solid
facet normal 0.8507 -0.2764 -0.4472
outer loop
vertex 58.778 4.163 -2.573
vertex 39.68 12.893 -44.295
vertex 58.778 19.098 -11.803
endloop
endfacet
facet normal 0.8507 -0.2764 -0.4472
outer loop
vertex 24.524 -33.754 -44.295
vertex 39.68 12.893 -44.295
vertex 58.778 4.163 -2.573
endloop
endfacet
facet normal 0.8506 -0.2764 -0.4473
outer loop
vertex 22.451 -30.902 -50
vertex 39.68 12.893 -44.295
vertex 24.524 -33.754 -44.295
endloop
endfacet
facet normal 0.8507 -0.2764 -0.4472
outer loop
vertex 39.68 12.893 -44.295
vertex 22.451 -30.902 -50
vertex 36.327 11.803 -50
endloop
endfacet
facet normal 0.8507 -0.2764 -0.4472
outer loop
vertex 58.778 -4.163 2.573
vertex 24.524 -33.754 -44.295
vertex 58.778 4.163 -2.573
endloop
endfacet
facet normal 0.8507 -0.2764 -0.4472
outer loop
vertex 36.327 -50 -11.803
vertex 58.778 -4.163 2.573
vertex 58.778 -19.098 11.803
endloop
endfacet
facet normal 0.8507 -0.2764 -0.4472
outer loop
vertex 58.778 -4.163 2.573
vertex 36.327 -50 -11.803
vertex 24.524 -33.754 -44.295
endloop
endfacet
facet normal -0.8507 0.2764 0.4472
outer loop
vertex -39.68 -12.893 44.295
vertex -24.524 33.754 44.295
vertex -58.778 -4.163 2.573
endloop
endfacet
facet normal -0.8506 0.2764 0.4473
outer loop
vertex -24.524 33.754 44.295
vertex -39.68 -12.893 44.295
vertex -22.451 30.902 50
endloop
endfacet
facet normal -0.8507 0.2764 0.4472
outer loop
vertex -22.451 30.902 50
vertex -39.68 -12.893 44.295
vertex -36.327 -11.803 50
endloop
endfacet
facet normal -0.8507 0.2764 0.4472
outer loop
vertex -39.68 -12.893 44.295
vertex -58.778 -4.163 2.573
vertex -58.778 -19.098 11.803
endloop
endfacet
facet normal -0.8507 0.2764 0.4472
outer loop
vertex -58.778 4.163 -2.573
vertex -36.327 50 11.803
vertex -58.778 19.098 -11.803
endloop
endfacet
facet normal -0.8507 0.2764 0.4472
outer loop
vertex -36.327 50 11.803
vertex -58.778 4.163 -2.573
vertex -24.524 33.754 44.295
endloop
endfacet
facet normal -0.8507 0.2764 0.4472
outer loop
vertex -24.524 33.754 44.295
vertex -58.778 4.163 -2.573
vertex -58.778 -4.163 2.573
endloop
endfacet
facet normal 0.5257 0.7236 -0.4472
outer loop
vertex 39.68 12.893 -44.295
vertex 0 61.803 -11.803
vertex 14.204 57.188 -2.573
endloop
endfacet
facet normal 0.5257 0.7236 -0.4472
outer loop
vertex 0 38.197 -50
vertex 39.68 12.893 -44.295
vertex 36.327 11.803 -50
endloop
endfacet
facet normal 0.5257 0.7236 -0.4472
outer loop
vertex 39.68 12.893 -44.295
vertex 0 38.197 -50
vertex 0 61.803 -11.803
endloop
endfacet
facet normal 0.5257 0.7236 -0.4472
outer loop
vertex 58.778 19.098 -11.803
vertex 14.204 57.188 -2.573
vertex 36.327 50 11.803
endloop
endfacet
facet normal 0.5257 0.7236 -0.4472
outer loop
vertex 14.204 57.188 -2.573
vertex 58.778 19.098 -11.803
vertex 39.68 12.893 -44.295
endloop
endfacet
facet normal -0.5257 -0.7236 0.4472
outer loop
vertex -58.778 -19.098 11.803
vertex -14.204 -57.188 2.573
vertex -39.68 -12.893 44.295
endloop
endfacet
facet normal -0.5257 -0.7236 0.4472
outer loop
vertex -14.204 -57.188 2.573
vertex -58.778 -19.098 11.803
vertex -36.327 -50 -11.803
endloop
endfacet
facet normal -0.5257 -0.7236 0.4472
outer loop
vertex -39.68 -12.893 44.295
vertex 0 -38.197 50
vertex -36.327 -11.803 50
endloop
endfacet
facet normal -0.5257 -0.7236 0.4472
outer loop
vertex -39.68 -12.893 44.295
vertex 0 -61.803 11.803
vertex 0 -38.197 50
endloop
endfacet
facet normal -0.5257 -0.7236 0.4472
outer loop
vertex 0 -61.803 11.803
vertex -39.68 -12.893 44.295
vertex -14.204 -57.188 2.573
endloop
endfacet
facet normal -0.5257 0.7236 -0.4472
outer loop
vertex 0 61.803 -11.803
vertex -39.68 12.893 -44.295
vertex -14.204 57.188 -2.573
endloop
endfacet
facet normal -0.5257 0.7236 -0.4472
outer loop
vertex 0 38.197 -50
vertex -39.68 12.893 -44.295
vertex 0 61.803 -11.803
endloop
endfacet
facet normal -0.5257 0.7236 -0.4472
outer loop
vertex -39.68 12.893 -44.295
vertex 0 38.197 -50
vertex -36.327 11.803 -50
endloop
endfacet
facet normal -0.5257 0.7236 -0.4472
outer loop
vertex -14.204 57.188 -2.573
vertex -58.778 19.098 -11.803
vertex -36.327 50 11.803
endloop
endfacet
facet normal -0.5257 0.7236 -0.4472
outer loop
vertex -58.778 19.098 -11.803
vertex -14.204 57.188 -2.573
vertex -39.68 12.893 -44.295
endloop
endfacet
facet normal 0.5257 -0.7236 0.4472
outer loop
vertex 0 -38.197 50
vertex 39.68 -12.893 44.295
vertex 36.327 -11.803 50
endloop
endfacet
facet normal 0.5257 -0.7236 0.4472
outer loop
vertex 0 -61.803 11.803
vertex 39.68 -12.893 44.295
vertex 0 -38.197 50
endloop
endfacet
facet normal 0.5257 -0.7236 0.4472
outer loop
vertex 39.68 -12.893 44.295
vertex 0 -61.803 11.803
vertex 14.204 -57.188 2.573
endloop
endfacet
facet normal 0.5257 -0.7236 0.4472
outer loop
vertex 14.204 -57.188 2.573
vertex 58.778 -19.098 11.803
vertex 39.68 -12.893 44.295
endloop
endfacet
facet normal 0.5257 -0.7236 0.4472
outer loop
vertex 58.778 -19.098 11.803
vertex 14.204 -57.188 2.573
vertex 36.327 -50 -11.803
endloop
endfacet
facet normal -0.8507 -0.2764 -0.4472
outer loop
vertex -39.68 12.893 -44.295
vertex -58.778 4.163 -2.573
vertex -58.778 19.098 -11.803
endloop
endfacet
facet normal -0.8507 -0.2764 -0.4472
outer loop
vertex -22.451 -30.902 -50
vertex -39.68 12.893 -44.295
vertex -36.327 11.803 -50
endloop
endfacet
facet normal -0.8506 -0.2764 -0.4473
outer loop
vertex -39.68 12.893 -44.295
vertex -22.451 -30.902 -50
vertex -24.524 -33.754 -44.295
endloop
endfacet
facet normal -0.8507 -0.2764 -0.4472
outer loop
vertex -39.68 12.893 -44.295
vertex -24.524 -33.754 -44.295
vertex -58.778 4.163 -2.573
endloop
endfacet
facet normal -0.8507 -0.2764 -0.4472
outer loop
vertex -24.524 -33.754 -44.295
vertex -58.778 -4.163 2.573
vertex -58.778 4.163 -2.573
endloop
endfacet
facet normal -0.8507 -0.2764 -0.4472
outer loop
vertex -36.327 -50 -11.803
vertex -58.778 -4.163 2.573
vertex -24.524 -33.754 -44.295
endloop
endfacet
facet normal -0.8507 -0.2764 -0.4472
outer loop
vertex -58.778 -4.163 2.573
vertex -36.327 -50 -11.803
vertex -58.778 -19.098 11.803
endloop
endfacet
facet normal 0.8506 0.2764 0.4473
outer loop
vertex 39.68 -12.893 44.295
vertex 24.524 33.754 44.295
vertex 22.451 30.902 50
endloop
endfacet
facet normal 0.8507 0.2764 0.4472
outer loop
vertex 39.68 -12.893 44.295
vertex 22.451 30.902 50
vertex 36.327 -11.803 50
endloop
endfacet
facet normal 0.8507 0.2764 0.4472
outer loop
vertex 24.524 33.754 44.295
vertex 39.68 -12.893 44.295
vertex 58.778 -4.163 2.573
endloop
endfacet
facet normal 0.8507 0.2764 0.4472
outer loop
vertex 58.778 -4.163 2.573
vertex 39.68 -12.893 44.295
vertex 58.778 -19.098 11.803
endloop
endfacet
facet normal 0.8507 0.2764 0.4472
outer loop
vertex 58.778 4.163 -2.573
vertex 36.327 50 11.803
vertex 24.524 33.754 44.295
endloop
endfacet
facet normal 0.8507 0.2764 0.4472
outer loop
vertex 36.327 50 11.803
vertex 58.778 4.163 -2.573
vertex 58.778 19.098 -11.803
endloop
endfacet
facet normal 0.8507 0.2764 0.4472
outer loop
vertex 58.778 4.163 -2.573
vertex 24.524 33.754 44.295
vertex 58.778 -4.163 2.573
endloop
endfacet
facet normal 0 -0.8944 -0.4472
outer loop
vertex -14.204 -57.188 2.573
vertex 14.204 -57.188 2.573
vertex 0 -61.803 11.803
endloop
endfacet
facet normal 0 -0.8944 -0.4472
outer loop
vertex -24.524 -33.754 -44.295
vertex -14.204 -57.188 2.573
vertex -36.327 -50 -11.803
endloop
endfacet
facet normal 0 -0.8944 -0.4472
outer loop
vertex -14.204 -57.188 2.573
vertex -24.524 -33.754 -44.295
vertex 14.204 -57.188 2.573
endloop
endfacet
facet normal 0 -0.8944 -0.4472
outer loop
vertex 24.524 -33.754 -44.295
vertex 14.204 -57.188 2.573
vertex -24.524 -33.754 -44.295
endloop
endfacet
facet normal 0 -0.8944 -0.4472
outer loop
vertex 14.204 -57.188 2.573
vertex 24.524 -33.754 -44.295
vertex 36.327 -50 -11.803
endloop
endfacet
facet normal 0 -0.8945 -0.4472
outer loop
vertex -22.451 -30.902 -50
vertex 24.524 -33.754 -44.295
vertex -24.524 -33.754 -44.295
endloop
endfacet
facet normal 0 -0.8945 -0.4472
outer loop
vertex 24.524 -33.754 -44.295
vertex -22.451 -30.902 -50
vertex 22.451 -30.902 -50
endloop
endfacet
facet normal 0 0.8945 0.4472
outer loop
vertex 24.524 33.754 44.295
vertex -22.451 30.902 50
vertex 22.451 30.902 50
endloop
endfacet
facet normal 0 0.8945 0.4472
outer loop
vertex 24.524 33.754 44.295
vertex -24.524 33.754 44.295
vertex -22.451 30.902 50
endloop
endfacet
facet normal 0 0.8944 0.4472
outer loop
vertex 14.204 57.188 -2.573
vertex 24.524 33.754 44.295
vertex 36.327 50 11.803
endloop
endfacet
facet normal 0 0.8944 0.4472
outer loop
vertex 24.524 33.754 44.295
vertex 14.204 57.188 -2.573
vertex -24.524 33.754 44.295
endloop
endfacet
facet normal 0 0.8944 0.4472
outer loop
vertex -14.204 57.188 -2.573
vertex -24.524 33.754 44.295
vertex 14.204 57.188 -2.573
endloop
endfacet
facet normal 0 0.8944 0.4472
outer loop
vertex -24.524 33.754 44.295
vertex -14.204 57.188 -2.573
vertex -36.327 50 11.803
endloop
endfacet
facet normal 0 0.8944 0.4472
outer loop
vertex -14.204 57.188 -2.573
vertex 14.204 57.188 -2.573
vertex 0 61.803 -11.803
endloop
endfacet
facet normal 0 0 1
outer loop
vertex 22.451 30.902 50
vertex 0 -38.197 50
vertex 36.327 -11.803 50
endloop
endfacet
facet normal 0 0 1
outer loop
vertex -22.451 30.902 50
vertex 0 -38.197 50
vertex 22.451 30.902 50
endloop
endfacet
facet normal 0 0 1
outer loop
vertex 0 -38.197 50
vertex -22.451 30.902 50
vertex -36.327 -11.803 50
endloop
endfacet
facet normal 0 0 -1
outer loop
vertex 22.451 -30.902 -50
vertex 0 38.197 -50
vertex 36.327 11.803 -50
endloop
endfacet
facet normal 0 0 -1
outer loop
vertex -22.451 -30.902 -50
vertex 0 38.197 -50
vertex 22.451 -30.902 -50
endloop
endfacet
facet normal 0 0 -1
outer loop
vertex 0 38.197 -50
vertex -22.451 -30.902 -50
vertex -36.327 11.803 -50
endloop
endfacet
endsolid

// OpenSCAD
$fn = $preview ? 35 : 100;
EPSILON = 0.01;

dihedral = 116.565;
size = 100;

module box(size) { cube([ 2 * size, 2 * size, size ], center = true); }

module dodecahedron(size) {
  intersection() {
    box(size);
    intersection_for(i = [1:5]) {
      rotate([ dihedral, 0, 360 / 5 * i ]) box(size);
    }
  }
}
dodecahedron(100);

// intersection() {
//   color([ 1, 0, 1 ]) box(size);
//   color([ 1, 0, 0 ]) rotate([ dihedral, 0, 360 / 5 * 0 ]) box(size);
//   color([ 0, 1, 0 ]) rotate([ dihedral, 0, 360 / 5 * 1 ]) box(size);
//   color([ 0, 0, 1 ]) rotate([ dihedral, 0, 360 / 5 * 2 ]) box(size);
//   color([ 1, 1, 0 ]) rotate([ dihedral, 0, 360 / 5 * 3 ]) box(size);
//   color([ 0, 1, 1 ]) rotate([ dihedral, 0, 360 / 5 * 4 ]) box(size);
// }
